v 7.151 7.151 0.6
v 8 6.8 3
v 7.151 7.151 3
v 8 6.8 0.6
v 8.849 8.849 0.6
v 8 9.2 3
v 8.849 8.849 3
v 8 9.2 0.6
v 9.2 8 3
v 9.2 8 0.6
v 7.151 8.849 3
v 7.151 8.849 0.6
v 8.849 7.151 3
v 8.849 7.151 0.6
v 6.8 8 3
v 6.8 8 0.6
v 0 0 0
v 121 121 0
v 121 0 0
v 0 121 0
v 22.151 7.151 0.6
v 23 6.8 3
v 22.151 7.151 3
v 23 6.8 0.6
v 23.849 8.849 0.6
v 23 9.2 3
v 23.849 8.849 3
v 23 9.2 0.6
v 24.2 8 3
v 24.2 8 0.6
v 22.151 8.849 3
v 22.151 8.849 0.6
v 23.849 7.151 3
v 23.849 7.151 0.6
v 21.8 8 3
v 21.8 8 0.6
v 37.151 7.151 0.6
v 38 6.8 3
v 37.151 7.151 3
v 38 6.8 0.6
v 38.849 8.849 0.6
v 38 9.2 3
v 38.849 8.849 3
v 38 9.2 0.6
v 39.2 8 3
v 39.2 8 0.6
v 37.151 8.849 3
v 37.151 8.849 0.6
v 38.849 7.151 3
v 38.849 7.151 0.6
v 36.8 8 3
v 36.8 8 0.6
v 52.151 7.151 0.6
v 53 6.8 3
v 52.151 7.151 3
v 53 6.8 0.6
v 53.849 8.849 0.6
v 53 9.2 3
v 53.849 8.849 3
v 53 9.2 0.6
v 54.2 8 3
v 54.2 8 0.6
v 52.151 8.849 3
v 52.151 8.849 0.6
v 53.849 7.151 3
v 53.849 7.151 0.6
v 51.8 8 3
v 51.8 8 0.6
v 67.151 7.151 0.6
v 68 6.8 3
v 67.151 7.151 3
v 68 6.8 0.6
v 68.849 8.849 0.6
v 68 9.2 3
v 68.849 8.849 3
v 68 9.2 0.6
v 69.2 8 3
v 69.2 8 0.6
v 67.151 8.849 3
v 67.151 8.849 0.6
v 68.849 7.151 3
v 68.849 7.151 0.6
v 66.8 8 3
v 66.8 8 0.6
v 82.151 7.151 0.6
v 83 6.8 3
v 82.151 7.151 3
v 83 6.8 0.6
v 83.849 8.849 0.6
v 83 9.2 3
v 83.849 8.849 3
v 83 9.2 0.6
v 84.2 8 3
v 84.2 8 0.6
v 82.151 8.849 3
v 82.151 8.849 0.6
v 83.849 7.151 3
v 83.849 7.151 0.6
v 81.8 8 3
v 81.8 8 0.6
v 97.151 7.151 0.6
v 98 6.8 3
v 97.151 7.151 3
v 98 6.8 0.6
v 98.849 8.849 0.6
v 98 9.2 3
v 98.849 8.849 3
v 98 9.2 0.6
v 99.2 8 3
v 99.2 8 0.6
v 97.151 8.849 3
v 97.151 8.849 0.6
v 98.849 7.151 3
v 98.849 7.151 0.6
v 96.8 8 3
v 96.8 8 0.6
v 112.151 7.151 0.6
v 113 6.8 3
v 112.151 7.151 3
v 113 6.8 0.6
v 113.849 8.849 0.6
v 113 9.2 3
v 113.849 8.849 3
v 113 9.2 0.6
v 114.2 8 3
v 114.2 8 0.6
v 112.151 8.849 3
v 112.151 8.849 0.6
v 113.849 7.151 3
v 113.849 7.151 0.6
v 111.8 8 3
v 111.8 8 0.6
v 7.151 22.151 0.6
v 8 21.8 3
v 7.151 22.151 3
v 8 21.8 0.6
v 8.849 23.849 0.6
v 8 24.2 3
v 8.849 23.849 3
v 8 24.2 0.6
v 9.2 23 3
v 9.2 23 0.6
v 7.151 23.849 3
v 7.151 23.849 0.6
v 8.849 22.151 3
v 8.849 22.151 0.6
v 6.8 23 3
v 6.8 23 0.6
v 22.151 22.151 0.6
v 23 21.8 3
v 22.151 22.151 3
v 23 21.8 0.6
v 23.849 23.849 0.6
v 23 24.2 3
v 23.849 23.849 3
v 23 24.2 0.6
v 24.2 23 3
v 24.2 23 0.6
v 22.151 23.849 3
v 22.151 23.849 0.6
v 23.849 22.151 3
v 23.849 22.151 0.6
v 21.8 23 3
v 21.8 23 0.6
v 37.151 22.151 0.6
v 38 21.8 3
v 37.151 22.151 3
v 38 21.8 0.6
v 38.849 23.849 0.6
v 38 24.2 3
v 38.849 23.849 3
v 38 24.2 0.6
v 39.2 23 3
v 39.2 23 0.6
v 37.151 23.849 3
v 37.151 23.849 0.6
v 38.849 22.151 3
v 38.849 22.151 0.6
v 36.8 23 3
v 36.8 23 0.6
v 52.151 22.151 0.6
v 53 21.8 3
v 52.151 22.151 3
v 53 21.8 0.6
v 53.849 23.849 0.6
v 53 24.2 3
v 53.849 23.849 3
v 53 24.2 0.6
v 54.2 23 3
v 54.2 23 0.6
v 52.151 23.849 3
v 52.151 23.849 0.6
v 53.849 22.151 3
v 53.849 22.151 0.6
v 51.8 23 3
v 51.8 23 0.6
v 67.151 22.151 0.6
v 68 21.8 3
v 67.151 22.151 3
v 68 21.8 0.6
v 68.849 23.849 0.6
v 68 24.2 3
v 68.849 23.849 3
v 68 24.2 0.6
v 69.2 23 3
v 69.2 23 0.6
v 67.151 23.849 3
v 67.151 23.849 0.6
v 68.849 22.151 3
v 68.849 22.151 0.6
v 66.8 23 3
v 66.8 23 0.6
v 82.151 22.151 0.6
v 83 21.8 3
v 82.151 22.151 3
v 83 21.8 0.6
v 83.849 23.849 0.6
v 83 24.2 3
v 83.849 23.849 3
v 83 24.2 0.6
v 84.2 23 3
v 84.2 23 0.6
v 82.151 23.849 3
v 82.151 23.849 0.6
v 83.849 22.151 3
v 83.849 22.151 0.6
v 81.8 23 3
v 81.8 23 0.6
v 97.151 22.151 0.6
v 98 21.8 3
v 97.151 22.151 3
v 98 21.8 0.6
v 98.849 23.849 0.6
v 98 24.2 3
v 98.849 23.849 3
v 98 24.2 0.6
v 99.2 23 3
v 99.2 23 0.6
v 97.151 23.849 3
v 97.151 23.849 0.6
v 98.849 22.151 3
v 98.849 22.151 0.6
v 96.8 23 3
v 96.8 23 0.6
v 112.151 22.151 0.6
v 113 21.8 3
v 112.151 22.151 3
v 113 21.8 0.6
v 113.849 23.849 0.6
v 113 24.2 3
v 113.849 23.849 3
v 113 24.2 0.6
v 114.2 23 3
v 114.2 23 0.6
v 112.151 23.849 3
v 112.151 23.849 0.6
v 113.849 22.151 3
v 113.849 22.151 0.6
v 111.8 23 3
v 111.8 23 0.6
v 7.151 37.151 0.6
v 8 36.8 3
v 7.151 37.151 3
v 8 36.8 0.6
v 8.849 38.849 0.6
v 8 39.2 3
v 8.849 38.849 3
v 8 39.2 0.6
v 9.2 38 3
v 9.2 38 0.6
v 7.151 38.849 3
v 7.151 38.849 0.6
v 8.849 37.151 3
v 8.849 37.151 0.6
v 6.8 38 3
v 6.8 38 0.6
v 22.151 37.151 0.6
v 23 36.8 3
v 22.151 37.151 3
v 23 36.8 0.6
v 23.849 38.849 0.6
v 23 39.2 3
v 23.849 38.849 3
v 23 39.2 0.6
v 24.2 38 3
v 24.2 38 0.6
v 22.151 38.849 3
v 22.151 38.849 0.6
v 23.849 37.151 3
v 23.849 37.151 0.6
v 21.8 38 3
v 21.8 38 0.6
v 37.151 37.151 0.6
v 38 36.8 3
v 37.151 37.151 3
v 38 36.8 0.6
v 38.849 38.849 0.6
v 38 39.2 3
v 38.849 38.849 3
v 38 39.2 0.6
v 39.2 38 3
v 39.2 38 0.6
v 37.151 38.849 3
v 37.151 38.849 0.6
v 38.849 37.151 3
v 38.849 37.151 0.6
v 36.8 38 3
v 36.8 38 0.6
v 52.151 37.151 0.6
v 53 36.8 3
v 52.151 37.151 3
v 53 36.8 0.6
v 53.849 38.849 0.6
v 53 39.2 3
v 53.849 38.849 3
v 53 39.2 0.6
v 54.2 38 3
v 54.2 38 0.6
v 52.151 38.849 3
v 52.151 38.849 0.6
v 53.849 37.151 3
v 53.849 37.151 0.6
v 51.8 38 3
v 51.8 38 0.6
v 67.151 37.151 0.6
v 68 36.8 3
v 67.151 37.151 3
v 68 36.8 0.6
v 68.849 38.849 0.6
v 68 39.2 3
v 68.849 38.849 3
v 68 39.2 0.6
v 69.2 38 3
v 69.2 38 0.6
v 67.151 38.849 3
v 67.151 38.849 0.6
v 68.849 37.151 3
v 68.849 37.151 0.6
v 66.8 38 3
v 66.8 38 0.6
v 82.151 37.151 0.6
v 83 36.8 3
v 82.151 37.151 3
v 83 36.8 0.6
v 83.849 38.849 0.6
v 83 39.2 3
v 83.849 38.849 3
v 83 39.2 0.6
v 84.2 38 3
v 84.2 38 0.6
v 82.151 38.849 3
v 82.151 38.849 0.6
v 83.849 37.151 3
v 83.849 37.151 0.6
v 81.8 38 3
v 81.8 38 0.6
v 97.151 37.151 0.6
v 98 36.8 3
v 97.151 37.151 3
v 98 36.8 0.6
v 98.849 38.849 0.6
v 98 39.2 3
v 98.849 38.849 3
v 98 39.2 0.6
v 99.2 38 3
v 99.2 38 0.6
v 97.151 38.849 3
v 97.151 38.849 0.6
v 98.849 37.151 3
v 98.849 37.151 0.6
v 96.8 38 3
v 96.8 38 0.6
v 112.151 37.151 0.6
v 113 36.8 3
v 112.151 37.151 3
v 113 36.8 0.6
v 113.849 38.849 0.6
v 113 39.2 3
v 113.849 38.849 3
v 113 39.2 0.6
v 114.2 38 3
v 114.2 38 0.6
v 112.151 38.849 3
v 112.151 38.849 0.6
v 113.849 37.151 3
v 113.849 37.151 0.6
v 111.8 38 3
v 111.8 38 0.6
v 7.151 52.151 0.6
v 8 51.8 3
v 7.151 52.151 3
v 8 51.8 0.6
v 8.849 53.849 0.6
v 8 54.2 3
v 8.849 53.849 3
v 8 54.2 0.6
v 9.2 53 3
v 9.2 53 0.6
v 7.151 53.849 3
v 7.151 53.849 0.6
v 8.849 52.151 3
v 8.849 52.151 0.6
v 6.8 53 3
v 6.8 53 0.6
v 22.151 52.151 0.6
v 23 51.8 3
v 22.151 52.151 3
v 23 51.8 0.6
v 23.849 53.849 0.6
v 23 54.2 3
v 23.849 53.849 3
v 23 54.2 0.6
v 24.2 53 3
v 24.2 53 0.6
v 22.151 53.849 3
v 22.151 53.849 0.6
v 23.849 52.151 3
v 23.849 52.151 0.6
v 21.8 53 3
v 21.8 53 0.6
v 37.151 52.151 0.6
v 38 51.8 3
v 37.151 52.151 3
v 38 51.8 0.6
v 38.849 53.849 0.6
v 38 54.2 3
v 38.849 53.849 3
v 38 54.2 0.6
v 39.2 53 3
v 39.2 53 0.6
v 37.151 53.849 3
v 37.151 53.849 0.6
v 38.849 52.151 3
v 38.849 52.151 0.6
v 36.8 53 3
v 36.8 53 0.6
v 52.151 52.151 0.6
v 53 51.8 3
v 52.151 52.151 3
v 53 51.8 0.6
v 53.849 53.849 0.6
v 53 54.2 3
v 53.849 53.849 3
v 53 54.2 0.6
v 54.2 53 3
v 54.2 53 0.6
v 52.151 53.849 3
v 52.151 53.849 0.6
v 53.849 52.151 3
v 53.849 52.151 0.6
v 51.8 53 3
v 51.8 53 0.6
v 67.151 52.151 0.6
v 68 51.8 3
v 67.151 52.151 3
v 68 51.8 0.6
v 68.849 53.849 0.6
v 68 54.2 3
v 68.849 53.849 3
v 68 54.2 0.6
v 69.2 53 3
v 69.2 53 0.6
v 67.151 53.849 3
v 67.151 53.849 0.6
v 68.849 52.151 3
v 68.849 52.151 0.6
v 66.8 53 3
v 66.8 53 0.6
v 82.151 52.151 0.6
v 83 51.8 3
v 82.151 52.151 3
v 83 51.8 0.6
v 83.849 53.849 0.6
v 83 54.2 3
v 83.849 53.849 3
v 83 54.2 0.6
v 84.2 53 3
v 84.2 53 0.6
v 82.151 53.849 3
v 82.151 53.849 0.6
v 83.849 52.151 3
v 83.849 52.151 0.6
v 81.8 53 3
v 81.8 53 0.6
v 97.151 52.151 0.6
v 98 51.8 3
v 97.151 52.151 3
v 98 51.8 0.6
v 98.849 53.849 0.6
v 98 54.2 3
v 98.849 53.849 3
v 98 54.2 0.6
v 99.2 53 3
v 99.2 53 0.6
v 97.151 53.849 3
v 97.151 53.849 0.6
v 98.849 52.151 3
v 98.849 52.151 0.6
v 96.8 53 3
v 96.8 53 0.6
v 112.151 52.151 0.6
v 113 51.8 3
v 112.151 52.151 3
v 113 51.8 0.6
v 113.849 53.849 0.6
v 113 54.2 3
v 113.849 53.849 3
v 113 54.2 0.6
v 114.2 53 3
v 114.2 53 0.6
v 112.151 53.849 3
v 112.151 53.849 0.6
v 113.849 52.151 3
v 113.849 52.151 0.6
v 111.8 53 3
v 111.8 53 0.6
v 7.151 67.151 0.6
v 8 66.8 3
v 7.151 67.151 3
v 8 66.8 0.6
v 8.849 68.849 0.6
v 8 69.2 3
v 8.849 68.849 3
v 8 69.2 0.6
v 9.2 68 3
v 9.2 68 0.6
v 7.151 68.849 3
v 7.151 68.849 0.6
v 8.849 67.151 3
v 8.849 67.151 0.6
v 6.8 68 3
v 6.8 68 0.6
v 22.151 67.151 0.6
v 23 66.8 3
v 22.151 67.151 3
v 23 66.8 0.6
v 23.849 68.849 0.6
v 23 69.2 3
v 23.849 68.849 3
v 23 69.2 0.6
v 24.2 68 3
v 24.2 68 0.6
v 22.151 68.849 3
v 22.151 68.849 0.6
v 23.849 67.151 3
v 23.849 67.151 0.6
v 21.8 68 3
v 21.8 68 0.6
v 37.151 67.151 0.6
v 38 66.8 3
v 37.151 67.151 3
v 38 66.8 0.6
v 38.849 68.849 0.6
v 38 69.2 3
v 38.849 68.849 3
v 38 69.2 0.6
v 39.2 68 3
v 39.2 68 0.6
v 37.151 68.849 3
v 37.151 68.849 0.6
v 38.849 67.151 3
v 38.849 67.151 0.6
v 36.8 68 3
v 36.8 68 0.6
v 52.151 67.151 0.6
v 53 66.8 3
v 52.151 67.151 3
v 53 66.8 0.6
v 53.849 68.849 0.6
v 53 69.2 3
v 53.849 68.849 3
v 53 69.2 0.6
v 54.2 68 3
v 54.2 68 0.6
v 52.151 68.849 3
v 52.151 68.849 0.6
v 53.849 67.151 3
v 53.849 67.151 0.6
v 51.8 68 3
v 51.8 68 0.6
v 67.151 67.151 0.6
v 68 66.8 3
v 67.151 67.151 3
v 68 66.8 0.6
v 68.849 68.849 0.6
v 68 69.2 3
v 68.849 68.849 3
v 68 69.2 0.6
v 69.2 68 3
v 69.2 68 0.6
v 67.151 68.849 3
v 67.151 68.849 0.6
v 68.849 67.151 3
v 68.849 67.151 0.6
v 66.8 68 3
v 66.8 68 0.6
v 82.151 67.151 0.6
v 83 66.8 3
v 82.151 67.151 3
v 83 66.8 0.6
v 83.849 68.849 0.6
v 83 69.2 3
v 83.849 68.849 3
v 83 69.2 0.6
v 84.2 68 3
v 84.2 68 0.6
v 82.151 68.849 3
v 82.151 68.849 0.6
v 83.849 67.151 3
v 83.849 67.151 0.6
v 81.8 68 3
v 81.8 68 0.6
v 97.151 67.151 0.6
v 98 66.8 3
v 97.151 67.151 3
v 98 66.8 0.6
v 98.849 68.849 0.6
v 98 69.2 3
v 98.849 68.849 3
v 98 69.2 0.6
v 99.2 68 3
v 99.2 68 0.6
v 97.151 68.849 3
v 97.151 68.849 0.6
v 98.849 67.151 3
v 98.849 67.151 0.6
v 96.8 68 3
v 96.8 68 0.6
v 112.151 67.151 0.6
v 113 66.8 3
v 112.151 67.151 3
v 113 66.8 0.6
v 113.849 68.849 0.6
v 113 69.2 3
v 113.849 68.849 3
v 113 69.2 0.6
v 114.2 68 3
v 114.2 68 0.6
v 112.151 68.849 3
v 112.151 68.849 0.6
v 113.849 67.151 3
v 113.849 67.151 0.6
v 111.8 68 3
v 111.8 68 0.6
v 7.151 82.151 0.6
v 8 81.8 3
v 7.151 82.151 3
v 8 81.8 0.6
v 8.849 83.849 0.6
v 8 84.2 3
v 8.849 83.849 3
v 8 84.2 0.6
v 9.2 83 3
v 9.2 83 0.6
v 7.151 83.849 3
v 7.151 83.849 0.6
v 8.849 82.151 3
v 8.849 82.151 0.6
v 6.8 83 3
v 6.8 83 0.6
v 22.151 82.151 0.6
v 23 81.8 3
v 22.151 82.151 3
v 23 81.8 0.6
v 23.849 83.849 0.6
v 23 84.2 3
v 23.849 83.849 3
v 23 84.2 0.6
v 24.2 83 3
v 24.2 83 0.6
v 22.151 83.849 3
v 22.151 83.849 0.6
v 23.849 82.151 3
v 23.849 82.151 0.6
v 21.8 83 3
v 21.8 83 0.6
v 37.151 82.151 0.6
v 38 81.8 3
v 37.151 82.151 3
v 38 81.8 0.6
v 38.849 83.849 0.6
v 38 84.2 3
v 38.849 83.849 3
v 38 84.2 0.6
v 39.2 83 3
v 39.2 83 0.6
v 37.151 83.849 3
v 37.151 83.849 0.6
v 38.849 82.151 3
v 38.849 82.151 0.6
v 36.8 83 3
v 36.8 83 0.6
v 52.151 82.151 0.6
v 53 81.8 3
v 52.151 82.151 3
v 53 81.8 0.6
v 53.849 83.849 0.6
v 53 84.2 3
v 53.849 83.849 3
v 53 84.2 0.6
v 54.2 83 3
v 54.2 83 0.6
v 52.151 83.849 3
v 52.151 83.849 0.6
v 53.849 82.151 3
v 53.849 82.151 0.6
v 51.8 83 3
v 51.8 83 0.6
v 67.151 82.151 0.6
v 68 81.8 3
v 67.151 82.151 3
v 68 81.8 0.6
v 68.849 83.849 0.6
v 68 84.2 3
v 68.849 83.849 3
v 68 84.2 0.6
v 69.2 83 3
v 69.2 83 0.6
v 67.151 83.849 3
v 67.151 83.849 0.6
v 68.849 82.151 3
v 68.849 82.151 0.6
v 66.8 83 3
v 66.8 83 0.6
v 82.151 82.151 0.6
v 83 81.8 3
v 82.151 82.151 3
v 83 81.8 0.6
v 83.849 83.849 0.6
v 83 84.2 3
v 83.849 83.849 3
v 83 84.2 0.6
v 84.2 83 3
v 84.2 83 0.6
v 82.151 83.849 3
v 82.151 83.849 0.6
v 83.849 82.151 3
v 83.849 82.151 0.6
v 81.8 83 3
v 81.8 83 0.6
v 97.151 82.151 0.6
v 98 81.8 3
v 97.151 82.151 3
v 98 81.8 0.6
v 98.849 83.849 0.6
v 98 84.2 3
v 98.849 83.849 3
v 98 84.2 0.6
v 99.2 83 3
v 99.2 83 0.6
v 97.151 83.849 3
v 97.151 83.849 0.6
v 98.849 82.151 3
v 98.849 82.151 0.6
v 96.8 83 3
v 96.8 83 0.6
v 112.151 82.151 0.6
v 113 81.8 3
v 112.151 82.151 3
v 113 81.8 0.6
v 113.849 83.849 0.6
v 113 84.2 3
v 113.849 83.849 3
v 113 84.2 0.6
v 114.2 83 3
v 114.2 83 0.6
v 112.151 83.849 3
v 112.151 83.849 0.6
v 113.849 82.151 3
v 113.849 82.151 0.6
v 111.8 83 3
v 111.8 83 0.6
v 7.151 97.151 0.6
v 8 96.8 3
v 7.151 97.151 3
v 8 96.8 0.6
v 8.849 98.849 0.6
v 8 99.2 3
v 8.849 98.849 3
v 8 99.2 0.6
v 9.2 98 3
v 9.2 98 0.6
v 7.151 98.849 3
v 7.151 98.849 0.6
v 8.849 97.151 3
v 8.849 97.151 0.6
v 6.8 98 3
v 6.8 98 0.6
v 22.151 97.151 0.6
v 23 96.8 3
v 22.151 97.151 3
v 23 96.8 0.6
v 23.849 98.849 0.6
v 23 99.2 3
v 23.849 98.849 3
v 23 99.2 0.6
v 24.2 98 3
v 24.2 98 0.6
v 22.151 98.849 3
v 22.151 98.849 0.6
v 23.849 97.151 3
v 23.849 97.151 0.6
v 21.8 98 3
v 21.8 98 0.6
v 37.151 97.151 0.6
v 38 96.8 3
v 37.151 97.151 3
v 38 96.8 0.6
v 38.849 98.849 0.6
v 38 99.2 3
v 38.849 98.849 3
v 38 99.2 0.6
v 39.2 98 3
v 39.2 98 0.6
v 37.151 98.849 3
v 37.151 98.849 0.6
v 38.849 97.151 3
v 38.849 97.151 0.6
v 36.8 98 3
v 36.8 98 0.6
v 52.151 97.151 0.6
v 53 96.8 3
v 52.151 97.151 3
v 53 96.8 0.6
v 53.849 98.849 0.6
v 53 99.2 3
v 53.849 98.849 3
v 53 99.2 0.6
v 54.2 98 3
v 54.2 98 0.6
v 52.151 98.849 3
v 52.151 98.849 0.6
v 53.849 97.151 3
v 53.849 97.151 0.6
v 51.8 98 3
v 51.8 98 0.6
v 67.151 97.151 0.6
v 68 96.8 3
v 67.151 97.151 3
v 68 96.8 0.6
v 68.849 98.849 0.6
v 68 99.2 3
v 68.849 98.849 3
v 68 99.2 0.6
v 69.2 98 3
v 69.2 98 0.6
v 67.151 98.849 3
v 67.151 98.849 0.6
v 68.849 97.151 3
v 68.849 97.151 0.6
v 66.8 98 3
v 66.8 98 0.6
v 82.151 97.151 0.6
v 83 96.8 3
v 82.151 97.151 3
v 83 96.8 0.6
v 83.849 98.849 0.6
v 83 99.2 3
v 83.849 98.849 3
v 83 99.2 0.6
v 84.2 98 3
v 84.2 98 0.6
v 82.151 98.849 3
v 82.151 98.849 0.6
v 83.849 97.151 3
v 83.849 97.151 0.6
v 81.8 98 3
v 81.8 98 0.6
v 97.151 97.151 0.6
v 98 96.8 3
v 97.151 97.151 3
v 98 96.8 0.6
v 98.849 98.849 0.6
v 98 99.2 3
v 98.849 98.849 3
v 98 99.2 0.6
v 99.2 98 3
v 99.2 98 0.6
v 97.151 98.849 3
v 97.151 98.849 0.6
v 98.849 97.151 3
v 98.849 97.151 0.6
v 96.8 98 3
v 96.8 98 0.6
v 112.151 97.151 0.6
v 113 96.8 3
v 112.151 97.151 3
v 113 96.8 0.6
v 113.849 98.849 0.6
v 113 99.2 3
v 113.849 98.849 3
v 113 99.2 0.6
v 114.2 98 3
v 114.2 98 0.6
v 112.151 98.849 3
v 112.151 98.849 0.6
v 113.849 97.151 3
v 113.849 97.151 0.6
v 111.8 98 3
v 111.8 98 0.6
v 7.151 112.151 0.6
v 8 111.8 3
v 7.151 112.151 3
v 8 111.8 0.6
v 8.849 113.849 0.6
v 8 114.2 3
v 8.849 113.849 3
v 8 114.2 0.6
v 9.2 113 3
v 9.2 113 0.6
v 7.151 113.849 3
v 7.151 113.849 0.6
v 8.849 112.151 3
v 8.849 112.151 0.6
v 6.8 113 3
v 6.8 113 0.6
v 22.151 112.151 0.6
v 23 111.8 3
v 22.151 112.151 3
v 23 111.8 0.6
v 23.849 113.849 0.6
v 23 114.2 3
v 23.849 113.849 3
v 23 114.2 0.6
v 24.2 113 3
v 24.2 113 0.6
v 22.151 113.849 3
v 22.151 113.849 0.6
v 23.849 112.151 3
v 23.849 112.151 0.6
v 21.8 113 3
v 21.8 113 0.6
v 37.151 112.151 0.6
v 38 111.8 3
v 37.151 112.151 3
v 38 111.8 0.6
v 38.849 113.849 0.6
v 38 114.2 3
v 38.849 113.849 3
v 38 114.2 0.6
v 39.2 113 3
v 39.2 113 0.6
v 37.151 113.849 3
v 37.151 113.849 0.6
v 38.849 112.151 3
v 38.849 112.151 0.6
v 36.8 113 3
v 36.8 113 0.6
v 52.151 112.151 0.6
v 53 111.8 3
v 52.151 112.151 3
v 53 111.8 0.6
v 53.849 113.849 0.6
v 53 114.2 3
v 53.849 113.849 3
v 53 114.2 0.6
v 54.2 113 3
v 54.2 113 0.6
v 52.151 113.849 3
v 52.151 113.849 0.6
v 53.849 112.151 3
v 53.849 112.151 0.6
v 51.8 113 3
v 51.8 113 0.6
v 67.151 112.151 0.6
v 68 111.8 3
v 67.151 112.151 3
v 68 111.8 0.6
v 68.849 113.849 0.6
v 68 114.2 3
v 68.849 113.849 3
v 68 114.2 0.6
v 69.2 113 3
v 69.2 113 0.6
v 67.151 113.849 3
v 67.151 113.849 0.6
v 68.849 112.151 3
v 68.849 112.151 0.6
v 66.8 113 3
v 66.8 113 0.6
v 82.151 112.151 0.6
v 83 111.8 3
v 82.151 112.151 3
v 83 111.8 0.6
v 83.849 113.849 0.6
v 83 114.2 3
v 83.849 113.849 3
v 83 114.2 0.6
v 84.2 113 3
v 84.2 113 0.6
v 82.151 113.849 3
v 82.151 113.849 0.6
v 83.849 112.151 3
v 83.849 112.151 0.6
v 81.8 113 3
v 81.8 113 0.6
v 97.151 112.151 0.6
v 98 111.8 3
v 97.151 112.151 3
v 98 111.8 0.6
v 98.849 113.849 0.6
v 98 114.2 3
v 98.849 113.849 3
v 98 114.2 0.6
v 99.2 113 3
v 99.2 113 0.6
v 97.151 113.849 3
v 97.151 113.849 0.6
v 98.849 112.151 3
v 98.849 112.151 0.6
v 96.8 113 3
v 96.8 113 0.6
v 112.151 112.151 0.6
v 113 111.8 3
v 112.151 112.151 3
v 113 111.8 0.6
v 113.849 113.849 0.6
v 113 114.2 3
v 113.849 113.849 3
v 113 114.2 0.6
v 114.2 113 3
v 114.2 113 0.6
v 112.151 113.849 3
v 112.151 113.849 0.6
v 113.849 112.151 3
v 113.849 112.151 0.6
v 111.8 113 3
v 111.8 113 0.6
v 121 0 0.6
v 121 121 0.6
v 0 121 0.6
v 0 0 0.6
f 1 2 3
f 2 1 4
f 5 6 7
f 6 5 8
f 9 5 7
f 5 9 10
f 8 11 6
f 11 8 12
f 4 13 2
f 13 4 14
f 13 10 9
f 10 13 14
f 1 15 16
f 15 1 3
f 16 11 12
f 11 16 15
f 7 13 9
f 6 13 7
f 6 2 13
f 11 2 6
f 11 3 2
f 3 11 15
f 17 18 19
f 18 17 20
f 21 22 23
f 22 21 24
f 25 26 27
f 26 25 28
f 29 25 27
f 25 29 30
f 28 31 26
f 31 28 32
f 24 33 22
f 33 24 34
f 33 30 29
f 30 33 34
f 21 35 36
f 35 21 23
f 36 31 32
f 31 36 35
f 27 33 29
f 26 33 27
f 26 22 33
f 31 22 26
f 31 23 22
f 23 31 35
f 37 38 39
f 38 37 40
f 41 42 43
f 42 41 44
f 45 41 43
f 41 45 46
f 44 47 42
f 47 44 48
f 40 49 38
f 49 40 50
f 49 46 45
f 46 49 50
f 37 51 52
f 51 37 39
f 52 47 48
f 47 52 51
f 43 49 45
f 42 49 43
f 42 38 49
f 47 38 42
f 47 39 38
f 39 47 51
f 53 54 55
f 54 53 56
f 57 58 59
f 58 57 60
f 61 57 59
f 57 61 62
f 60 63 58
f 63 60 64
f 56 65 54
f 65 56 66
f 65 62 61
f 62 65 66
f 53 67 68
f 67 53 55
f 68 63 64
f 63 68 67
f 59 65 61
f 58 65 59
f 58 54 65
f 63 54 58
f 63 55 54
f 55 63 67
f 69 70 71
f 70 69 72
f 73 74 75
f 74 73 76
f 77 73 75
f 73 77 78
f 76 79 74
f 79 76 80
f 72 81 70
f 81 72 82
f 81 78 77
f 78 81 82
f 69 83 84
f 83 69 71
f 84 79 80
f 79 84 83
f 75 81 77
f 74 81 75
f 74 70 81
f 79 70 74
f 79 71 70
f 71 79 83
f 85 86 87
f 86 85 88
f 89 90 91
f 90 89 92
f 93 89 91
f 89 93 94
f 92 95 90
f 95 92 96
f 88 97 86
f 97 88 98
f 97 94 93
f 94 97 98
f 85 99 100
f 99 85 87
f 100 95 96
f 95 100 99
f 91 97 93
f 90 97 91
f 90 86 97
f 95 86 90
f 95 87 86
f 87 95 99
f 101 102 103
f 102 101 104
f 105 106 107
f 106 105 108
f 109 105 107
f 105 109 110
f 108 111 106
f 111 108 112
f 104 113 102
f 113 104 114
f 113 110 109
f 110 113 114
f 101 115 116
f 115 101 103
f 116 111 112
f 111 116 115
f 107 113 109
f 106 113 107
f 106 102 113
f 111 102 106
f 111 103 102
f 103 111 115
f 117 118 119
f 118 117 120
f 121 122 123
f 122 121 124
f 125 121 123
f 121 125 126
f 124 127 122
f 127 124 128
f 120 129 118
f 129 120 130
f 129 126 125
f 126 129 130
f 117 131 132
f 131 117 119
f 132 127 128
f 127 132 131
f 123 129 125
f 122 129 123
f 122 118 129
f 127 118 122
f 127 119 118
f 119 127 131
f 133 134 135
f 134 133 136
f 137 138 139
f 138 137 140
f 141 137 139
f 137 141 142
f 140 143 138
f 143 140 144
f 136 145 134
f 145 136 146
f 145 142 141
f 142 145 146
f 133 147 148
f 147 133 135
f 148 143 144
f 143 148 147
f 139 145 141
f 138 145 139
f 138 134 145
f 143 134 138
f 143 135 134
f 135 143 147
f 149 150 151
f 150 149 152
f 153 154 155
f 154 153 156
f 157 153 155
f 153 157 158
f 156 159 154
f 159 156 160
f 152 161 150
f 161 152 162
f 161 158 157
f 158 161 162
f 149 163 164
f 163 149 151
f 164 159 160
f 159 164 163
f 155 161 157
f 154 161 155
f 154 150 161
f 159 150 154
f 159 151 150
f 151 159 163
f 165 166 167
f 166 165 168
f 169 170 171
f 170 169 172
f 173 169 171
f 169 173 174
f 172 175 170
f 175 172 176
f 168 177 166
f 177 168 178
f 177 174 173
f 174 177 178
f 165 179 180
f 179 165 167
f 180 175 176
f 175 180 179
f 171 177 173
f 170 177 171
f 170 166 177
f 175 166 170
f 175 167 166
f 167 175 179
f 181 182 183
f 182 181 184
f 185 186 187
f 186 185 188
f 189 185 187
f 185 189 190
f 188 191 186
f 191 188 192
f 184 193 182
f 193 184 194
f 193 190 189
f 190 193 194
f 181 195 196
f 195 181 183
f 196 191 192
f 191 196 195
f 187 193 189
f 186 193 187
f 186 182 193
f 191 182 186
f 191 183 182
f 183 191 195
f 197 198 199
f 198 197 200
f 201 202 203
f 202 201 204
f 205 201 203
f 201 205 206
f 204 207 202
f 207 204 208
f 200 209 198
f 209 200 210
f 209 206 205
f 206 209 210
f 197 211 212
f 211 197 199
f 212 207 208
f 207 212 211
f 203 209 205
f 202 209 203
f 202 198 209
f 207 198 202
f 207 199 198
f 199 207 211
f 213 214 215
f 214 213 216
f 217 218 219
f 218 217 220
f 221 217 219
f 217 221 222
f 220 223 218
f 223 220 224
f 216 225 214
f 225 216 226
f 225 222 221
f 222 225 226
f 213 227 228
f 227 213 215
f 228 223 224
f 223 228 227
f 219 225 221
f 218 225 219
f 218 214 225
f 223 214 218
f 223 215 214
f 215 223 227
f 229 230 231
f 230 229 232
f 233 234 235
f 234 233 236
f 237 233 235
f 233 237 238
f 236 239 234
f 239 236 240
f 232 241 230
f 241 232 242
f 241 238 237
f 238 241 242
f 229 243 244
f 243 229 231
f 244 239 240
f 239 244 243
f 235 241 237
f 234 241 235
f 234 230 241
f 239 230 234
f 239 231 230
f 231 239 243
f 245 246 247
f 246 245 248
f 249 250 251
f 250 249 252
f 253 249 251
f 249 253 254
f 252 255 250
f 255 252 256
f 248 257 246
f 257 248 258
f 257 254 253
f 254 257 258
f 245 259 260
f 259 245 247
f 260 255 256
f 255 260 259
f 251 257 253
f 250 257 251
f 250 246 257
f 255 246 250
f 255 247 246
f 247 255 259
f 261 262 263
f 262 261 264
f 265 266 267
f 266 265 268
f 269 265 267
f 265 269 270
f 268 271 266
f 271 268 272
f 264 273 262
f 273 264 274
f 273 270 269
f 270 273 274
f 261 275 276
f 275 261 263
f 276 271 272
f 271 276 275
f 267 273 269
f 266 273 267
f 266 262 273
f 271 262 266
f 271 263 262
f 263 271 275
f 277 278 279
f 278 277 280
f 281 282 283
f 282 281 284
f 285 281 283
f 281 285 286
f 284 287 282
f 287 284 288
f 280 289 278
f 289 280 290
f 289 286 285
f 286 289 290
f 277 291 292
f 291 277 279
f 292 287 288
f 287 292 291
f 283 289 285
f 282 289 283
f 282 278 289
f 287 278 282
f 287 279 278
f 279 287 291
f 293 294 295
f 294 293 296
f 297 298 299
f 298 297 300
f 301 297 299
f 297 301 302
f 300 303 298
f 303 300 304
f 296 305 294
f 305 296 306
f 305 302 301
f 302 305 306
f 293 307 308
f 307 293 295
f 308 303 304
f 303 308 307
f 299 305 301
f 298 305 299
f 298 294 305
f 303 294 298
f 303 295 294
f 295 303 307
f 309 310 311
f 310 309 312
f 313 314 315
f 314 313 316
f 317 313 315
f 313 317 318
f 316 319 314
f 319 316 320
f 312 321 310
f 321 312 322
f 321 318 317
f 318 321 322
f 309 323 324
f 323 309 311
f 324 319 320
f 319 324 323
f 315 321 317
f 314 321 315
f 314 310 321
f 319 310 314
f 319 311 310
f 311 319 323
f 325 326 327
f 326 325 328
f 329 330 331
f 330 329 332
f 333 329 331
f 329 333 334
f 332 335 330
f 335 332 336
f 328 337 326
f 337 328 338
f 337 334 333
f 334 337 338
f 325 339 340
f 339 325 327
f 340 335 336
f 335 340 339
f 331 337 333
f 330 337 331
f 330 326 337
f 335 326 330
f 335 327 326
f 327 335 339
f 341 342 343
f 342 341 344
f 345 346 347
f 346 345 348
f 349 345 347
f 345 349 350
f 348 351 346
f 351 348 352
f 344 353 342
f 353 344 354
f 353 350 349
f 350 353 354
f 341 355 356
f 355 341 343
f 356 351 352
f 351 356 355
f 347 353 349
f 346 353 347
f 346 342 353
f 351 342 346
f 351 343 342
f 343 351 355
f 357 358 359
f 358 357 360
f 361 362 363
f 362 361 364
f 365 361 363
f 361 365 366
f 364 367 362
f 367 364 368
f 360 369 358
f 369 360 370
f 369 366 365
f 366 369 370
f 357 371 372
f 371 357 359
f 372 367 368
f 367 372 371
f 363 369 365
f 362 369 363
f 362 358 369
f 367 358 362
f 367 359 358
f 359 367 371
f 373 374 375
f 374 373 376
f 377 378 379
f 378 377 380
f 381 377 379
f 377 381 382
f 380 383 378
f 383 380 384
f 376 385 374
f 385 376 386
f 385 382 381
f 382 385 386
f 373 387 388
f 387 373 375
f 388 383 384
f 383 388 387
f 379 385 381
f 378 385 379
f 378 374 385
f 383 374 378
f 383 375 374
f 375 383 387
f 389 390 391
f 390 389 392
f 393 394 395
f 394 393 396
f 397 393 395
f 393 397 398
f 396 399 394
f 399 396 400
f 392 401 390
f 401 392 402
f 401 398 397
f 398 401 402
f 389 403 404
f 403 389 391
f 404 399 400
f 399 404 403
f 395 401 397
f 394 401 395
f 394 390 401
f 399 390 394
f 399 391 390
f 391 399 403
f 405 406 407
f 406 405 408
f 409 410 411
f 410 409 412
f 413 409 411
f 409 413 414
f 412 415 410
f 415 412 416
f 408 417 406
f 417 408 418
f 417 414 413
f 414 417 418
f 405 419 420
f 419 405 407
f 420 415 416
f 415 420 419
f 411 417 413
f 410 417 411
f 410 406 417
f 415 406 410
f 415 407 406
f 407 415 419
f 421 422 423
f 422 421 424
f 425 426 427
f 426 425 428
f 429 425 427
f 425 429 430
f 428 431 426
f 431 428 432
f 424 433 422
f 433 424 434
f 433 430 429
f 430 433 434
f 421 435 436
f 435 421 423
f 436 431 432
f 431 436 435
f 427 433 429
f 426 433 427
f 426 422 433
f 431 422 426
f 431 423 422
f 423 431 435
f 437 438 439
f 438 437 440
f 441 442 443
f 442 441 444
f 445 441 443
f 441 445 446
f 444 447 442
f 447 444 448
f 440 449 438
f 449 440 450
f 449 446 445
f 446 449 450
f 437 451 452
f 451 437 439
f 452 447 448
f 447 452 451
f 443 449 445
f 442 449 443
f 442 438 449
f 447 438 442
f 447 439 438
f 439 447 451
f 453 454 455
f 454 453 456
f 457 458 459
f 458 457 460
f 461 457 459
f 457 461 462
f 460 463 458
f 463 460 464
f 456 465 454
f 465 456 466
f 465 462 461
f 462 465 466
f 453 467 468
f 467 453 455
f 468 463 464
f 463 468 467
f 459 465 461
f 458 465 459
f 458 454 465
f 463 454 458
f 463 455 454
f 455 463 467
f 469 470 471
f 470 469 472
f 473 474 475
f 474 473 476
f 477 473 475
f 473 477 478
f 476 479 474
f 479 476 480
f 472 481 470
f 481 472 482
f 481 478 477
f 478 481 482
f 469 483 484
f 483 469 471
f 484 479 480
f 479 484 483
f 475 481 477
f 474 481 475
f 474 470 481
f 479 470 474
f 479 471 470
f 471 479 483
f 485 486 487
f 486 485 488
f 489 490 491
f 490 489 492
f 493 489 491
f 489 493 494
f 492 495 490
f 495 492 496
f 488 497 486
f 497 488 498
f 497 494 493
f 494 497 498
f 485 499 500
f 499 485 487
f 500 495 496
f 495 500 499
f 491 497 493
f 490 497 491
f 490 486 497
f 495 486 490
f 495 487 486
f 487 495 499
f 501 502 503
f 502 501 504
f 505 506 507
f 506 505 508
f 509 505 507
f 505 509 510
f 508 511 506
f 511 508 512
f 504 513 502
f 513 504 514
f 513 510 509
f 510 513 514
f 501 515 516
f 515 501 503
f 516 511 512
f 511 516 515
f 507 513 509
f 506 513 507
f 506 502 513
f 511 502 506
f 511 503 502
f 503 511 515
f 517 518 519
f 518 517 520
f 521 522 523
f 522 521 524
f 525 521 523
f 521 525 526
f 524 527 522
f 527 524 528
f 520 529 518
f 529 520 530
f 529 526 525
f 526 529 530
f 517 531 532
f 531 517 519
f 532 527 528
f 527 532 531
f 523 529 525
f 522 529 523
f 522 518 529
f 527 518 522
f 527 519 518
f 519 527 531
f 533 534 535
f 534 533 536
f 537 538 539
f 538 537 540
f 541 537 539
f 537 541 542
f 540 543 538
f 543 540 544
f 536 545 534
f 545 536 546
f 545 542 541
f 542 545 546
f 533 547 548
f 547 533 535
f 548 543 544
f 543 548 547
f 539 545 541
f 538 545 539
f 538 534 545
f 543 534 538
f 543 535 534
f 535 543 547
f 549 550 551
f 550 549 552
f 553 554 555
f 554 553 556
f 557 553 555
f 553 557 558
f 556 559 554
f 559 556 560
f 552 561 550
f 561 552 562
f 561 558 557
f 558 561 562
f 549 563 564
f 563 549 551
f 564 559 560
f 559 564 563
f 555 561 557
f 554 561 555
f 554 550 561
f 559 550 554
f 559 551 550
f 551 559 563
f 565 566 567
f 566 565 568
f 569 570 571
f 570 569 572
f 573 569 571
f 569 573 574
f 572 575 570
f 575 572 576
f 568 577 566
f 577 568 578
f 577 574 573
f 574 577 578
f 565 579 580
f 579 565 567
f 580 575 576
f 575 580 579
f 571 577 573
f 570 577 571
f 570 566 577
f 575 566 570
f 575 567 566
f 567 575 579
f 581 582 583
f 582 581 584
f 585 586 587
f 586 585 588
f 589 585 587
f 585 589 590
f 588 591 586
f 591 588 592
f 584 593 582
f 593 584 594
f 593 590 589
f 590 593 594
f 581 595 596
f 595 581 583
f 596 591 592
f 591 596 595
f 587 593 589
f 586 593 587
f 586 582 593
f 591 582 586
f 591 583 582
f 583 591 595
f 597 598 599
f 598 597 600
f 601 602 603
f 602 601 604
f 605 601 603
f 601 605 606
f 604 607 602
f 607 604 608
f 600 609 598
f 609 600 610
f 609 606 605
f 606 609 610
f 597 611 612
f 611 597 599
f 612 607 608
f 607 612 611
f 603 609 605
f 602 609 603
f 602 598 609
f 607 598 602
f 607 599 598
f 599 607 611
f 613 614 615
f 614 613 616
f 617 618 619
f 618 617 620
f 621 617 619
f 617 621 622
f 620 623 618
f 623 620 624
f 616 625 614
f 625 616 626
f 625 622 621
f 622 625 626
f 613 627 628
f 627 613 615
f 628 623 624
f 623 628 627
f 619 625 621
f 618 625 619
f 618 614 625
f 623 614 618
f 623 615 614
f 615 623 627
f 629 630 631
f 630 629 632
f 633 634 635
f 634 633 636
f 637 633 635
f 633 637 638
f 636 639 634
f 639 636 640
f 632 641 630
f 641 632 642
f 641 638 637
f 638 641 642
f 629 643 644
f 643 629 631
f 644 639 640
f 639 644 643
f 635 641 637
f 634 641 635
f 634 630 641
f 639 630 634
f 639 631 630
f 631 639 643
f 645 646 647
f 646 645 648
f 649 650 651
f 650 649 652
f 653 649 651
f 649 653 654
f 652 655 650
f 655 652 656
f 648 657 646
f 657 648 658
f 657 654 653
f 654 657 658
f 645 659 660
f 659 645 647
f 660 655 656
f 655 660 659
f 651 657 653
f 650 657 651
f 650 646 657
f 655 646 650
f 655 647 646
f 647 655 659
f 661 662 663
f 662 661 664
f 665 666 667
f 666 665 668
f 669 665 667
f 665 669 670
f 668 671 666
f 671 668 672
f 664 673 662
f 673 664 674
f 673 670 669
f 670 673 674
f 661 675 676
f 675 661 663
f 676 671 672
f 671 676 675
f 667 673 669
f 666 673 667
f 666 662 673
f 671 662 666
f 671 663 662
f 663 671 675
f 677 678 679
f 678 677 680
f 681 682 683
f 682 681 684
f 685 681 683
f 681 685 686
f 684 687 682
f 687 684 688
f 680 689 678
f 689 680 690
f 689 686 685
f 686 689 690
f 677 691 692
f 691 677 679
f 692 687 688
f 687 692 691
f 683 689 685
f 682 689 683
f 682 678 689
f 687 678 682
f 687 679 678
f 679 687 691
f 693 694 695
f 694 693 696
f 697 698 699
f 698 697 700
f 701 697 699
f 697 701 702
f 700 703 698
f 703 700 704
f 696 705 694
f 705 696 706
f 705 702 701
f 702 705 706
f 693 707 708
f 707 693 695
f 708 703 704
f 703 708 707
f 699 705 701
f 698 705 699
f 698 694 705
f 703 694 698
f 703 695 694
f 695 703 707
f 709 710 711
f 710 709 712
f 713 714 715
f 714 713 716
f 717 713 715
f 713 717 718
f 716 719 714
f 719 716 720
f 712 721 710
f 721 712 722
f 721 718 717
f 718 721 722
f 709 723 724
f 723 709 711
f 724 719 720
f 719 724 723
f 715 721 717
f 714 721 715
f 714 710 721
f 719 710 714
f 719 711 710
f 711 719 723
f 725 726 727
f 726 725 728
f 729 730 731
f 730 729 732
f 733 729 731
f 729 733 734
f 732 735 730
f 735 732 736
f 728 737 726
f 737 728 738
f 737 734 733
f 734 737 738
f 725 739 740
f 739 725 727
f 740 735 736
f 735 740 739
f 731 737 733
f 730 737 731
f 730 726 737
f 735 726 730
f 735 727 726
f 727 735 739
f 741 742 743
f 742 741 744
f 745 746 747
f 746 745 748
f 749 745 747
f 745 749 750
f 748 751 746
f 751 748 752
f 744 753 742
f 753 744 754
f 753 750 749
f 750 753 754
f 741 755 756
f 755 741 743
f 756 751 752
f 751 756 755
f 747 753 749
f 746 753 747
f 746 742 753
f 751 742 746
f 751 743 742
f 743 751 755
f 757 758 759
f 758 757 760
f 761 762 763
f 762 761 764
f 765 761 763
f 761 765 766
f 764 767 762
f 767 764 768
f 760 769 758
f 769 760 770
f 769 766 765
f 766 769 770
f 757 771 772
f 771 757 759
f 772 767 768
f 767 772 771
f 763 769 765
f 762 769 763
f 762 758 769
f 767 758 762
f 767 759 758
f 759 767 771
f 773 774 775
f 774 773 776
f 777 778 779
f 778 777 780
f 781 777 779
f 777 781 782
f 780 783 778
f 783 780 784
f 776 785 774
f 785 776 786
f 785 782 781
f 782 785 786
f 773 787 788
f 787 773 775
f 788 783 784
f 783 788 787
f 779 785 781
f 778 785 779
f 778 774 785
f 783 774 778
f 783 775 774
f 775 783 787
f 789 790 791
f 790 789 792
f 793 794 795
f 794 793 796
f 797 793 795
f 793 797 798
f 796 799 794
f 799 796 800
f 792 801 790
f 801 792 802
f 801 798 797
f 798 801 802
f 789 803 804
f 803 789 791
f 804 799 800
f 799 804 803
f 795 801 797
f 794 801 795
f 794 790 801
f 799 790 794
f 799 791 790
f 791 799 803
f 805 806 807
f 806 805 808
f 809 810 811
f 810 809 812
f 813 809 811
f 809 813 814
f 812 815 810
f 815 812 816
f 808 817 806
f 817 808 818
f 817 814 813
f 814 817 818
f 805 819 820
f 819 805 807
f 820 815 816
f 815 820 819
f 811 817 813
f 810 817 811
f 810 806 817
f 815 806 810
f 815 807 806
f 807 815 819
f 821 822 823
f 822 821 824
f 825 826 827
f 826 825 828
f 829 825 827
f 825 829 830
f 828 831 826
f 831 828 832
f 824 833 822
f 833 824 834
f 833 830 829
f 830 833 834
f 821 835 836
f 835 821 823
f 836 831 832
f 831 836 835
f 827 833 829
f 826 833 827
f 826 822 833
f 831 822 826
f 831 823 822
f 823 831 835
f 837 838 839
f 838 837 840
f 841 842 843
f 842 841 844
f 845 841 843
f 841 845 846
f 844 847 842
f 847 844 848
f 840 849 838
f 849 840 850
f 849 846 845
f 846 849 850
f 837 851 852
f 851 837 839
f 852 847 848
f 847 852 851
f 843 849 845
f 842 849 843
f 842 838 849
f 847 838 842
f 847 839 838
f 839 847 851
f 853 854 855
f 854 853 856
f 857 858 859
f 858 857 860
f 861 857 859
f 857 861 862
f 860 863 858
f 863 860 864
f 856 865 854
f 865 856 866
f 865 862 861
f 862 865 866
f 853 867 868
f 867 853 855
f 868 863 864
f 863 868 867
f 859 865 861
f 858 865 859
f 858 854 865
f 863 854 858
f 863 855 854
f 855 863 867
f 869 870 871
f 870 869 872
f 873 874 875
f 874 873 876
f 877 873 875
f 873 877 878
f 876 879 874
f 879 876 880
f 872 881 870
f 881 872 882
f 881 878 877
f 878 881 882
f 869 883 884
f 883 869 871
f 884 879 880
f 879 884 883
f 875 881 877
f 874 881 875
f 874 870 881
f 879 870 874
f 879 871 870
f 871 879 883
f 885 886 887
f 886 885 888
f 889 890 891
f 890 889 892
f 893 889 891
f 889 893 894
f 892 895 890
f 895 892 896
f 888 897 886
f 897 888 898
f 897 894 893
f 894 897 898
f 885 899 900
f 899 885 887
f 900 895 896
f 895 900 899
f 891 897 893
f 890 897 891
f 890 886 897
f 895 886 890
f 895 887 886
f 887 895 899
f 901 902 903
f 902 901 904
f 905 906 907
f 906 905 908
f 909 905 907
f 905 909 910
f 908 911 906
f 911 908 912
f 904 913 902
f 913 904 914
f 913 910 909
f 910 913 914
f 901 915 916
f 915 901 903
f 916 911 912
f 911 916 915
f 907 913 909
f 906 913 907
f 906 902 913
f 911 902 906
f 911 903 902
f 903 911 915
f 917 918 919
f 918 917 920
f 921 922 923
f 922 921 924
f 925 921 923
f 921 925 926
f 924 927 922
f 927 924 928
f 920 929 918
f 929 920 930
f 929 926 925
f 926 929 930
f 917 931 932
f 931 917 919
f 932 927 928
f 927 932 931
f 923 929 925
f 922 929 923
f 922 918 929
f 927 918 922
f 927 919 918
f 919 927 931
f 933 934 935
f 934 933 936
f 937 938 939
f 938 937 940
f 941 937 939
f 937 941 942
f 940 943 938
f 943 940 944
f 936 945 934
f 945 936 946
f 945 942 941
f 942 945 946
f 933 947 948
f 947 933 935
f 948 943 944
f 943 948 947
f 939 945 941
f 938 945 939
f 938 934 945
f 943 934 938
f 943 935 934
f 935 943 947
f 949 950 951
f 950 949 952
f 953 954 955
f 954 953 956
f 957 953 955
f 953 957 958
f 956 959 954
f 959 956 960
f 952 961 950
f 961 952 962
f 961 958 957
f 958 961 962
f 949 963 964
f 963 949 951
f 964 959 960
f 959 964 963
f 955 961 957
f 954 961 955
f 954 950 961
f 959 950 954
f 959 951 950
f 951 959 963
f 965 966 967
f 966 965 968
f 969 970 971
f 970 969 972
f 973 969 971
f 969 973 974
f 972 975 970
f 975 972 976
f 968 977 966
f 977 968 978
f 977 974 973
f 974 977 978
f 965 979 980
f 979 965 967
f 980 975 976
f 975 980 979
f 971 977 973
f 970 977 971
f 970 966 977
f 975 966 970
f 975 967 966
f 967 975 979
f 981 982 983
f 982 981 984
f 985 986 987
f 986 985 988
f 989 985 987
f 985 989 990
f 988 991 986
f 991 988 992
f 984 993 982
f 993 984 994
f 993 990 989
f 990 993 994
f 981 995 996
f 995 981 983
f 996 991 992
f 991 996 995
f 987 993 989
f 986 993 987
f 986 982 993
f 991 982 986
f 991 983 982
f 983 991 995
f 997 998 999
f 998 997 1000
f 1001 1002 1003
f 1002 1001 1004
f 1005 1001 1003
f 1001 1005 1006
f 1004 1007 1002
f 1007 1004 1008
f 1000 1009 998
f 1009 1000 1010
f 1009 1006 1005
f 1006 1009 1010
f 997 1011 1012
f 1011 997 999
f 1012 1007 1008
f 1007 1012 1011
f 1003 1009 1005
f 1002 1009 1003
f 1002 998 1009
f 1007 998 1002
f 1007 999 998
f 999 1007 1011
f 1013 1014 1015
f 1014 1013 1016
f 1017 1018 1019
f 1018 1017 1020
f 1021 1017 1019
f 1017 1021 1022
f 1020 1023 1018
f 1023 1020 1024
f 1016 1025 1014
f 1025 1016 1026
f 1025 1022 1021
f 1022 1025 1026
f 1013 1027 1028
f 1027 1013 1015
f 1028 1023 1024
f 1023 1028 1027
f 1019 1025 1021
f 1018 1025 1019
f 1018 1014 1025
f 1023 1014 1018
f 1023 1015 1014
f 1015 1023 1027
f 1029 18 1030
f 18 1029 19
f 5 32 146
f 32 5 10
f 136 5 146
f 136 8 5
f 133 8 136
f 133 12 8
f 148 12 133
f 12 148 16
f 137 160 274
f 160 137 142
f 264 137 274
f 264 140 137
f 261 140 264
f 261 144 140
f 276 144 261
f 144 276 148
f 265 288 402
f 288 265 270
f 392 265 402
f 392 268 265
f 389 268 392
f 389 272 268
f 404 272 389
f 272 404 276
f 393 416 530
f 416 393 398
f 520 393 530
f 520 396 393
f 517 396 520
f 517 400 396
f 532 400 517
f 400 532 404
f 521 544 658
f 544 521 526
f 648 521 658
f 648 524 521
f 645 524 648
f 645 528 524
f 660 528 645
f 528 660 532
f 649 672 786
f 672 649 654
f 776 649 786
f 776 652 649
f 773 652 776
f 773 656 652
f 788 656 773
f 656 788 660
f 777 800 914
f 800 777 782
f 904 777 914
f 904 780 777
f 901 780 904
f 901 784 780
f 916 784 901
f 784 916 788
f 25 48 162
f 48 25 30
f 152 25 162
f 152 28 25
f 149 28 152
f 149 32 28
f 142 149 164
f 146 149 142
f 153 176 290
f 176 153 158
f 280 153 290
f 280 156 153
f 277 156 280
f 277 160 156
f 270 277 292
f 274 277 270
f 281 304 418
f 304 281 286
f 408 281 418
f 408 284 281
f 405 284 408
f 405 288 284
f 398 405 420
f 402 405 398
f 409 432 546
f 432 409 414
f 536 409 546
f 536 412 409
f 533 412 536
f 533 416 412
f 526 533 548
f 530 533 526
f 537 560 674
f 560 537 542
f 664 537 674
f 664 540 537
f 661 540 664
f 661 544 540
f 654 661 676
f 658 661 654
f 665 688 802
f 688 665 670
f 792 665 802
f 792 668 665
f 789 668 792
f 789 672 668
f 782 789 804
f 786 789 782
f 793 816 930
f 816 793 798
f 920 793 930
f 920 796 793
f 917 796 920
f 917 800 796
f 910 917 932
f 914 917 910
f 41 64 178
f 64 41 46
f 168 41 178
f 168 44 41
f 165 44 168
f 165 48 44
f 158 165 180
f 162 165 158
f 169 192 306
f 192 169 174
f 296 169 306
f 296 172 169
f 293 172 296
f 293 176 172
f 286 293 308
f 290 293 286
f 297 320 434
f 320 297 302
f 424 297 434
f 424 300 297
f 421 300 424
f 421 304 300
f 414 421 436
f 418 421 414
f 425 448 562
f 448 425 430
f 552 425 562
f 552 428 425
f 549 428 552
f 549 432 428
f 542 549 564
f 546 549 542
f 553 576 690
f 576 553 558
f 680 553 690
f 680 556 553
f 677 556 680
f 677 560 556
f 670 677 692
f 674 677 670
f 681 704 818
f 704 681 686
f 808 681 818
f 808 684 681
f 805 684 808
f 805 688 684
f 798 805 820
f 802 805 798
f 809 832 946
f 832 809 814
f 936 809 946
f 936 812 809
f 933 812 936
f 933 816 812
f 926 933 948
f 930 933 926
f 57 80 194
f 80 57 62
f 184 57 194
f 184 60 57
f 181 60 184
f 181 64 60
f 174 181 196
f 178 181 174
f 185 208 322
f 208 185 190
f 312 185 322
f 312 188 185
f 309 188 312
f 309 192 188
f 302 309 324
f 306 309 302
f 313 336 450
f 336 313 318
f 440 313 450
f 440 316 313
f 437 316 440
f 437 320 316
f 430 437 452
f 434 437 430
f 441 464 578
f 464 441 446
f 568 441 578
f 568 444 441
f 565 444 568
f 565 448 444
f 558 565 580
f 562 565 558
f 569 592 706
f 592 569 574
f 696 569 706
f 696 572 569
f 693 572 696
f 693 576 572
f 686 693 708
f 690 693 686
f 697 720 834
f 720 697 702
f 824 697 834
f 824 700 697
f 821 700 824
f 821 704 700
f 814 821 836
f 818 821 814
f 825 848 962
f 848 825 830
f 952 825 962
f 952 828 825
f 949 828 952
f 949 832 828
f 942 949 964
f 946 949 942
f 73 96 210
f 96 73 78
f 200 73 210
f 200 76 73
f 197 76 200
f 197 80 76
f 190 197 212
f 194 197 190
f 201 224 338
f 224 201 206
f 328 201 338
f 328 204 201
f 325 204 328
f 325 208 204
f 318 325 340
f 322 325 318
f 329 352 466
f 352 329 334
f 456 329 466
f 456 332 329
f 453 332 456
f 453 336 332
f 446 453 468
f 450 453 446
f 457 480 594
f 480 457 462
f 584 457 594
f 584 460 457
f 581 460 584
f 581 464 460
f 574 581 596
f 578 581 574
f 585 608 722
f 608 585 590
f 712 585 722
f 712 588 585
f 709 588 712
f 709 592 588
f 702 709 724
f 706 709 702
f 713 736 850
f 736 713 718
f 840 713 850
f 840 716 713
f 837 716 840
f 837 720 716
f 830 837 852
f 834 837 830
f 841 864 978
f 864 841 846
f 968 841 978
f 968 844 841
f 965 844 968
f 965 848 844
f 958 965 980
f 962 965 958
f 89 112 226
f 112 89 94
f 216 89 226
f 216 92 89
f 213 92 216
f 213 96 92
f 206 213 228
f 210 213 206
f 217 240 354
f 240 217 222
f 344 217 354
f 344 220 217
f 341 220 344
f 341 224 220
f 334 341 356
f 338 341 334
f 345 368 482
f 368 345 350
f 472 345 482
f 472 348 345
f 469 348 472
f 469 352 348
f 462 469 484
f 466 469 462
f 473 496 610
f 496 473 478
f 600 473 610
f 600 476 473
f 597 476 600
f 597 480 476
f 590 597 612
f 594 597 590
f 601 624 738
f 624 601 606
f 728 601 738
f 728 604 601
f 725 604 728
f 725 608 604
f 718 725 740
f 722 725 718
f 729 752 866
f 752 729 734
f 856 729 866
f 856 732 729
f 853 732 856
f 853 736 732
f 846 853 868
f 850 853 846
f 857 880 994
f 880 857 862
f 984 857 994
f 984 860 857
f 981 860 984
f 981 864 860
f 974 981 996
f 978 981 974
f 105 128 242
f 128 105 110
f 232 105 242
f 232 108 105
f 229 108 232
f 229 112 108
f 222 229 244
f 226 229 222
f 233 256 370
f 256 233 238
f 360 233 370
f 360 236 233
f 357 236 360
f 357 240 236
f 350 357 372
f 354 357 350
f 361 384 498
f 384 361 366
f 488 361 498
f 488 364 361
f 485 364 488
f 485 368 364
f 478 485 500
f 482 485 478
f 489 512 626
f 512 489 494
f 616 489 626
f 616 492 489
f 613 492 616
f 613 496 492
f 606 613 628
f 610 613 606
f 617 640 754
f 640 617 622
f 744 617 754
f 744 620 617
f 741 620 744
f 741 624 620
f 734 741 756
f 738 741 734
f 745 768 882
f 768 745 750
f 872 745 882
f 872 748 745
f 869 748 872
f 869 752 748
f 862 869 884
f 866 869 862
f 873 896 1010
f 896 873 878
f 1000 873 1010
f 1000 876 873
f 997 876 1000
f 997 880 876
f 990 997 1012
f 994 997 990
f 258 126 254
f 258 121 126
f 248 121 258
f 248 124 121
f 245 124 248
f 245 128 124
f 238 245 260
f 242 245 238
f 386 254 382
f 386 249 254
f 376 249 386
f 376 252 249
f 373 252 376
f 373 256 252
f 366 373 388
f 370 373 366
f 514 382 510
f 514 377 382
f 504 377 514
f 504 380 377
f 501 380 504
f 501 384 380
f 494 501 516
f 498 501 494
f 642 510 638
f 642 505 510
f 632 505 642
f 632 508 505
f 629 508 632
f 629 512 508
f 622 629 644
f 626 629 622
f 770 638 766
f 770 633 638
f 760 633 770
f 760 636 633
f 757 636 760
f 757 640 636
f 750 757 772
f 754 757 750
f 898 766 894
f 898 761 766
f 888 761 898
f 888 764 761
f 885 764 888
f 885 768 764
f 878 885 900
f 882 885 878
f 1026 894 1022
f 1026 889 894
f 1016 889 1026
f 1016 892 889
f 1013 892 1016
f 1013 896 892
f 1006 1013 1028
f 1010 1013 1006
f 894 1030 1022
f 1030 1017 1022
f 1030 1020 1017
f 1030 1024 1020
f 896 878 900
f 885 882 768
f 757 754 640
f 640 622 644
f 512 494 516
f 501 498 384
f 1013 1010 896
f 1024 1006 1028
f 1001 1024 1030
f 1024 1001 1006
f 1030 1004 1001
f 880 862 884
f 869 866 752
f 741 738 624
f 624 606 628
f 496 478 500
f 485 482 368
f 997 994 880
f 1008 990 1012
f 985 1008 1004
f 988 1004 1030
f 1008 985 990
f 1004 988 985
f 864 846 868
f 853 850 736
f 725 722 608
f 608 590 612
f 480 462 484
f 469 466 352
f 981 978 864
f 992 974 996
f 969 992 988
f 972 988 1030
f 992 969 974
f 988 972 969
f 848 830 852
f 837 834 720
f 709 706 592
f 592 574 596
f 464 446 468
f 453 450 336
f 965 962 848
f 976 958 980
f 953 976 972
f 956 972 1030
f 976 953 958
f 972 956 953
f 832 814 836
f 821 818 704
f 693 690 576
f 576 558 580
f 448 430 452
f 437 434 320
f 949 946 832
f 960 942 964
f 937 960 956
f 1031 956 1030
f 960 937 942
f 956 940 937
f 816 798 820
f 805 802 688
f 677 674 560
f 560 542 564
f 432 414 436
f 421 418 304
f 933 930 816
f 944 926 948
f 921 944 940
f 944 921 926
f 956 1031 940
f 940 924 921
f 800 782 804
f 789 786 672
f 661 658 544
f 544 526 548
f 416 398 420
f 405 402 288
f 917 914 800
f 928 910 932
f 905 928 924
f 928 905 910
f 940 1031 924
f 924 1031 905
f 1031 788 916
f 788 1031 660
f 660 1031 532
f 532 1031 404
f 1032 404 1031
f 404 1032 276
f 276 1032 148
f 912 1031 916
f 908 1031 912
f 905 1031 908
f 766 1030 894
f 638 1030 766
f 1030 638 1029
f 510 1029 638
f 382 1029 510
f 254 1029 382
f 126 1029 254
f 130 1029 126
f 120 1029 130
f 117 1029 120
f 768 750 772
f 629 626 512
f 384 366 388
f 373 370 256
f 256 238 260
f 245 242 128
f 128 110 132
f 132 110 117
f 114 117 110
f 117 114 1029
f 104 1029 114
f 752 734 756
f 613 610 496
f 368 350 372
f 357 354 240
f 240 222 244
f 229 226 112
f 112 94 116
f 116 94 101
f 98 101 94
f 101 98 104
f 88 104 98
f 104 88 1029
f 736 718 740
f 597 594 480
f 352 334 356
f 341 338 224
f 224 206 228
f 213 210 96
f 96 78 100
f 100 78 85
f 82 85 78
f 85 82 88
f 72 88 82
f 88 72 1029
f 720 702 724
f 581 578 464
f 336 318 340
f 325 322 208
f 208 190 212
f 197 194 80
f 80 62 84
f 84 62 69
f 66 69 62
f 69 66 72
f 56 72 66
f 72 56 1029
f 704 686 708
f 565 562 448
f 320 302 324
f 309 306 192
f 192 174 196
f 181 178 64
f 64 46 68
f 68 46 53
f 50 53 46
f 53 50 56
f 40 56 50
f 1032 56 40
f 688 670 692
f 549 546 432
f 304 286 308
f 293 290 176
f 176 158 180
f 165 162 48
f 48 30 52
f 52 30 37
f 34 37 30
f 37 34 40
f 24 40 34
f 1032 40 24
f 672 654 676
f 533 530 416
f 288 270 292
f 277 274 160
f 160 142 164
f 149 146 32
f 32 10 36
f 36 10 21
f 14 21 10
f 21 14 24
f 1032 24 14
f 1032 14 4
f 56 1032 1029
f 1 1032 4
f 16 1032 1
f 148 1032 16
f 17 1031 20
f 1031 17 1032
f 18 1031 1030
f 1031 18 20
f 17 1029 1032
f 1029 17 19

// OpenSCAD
// file: config.scad
$rows = 8;
$columns = 8;
$height = 8.5;
$distance = 15;
$gutter = 8;

$led_diameter = 3;
$led_height = 5;
$flange_height = 1;
$flange_diameter = 3.5;
$flange_flat_diameter = 3.4;
$snug_clearance = 0.2;
$lead_diameter = 0.5;

$wire_guide_distance = 5.5;
$wire_guide_height = 2.5;

function extent(holes) = (holes - 1) * $distance + 2 * $gutter;
// main file
$fs = 1;
$fa = 0.1;

include <config.scad>;

cube([extent($rows), extent($columns), 0.6]);
for (i = [0:$rows - 1])
    for (j = [0:$columns - 1])
        translate([$gutter + j * $distance, $gutter + i * $distance, 0])
            cylinder(d = $led_diameter * 0.8, h = 3);

// vim:set sts=4 sw=4 ai et:
